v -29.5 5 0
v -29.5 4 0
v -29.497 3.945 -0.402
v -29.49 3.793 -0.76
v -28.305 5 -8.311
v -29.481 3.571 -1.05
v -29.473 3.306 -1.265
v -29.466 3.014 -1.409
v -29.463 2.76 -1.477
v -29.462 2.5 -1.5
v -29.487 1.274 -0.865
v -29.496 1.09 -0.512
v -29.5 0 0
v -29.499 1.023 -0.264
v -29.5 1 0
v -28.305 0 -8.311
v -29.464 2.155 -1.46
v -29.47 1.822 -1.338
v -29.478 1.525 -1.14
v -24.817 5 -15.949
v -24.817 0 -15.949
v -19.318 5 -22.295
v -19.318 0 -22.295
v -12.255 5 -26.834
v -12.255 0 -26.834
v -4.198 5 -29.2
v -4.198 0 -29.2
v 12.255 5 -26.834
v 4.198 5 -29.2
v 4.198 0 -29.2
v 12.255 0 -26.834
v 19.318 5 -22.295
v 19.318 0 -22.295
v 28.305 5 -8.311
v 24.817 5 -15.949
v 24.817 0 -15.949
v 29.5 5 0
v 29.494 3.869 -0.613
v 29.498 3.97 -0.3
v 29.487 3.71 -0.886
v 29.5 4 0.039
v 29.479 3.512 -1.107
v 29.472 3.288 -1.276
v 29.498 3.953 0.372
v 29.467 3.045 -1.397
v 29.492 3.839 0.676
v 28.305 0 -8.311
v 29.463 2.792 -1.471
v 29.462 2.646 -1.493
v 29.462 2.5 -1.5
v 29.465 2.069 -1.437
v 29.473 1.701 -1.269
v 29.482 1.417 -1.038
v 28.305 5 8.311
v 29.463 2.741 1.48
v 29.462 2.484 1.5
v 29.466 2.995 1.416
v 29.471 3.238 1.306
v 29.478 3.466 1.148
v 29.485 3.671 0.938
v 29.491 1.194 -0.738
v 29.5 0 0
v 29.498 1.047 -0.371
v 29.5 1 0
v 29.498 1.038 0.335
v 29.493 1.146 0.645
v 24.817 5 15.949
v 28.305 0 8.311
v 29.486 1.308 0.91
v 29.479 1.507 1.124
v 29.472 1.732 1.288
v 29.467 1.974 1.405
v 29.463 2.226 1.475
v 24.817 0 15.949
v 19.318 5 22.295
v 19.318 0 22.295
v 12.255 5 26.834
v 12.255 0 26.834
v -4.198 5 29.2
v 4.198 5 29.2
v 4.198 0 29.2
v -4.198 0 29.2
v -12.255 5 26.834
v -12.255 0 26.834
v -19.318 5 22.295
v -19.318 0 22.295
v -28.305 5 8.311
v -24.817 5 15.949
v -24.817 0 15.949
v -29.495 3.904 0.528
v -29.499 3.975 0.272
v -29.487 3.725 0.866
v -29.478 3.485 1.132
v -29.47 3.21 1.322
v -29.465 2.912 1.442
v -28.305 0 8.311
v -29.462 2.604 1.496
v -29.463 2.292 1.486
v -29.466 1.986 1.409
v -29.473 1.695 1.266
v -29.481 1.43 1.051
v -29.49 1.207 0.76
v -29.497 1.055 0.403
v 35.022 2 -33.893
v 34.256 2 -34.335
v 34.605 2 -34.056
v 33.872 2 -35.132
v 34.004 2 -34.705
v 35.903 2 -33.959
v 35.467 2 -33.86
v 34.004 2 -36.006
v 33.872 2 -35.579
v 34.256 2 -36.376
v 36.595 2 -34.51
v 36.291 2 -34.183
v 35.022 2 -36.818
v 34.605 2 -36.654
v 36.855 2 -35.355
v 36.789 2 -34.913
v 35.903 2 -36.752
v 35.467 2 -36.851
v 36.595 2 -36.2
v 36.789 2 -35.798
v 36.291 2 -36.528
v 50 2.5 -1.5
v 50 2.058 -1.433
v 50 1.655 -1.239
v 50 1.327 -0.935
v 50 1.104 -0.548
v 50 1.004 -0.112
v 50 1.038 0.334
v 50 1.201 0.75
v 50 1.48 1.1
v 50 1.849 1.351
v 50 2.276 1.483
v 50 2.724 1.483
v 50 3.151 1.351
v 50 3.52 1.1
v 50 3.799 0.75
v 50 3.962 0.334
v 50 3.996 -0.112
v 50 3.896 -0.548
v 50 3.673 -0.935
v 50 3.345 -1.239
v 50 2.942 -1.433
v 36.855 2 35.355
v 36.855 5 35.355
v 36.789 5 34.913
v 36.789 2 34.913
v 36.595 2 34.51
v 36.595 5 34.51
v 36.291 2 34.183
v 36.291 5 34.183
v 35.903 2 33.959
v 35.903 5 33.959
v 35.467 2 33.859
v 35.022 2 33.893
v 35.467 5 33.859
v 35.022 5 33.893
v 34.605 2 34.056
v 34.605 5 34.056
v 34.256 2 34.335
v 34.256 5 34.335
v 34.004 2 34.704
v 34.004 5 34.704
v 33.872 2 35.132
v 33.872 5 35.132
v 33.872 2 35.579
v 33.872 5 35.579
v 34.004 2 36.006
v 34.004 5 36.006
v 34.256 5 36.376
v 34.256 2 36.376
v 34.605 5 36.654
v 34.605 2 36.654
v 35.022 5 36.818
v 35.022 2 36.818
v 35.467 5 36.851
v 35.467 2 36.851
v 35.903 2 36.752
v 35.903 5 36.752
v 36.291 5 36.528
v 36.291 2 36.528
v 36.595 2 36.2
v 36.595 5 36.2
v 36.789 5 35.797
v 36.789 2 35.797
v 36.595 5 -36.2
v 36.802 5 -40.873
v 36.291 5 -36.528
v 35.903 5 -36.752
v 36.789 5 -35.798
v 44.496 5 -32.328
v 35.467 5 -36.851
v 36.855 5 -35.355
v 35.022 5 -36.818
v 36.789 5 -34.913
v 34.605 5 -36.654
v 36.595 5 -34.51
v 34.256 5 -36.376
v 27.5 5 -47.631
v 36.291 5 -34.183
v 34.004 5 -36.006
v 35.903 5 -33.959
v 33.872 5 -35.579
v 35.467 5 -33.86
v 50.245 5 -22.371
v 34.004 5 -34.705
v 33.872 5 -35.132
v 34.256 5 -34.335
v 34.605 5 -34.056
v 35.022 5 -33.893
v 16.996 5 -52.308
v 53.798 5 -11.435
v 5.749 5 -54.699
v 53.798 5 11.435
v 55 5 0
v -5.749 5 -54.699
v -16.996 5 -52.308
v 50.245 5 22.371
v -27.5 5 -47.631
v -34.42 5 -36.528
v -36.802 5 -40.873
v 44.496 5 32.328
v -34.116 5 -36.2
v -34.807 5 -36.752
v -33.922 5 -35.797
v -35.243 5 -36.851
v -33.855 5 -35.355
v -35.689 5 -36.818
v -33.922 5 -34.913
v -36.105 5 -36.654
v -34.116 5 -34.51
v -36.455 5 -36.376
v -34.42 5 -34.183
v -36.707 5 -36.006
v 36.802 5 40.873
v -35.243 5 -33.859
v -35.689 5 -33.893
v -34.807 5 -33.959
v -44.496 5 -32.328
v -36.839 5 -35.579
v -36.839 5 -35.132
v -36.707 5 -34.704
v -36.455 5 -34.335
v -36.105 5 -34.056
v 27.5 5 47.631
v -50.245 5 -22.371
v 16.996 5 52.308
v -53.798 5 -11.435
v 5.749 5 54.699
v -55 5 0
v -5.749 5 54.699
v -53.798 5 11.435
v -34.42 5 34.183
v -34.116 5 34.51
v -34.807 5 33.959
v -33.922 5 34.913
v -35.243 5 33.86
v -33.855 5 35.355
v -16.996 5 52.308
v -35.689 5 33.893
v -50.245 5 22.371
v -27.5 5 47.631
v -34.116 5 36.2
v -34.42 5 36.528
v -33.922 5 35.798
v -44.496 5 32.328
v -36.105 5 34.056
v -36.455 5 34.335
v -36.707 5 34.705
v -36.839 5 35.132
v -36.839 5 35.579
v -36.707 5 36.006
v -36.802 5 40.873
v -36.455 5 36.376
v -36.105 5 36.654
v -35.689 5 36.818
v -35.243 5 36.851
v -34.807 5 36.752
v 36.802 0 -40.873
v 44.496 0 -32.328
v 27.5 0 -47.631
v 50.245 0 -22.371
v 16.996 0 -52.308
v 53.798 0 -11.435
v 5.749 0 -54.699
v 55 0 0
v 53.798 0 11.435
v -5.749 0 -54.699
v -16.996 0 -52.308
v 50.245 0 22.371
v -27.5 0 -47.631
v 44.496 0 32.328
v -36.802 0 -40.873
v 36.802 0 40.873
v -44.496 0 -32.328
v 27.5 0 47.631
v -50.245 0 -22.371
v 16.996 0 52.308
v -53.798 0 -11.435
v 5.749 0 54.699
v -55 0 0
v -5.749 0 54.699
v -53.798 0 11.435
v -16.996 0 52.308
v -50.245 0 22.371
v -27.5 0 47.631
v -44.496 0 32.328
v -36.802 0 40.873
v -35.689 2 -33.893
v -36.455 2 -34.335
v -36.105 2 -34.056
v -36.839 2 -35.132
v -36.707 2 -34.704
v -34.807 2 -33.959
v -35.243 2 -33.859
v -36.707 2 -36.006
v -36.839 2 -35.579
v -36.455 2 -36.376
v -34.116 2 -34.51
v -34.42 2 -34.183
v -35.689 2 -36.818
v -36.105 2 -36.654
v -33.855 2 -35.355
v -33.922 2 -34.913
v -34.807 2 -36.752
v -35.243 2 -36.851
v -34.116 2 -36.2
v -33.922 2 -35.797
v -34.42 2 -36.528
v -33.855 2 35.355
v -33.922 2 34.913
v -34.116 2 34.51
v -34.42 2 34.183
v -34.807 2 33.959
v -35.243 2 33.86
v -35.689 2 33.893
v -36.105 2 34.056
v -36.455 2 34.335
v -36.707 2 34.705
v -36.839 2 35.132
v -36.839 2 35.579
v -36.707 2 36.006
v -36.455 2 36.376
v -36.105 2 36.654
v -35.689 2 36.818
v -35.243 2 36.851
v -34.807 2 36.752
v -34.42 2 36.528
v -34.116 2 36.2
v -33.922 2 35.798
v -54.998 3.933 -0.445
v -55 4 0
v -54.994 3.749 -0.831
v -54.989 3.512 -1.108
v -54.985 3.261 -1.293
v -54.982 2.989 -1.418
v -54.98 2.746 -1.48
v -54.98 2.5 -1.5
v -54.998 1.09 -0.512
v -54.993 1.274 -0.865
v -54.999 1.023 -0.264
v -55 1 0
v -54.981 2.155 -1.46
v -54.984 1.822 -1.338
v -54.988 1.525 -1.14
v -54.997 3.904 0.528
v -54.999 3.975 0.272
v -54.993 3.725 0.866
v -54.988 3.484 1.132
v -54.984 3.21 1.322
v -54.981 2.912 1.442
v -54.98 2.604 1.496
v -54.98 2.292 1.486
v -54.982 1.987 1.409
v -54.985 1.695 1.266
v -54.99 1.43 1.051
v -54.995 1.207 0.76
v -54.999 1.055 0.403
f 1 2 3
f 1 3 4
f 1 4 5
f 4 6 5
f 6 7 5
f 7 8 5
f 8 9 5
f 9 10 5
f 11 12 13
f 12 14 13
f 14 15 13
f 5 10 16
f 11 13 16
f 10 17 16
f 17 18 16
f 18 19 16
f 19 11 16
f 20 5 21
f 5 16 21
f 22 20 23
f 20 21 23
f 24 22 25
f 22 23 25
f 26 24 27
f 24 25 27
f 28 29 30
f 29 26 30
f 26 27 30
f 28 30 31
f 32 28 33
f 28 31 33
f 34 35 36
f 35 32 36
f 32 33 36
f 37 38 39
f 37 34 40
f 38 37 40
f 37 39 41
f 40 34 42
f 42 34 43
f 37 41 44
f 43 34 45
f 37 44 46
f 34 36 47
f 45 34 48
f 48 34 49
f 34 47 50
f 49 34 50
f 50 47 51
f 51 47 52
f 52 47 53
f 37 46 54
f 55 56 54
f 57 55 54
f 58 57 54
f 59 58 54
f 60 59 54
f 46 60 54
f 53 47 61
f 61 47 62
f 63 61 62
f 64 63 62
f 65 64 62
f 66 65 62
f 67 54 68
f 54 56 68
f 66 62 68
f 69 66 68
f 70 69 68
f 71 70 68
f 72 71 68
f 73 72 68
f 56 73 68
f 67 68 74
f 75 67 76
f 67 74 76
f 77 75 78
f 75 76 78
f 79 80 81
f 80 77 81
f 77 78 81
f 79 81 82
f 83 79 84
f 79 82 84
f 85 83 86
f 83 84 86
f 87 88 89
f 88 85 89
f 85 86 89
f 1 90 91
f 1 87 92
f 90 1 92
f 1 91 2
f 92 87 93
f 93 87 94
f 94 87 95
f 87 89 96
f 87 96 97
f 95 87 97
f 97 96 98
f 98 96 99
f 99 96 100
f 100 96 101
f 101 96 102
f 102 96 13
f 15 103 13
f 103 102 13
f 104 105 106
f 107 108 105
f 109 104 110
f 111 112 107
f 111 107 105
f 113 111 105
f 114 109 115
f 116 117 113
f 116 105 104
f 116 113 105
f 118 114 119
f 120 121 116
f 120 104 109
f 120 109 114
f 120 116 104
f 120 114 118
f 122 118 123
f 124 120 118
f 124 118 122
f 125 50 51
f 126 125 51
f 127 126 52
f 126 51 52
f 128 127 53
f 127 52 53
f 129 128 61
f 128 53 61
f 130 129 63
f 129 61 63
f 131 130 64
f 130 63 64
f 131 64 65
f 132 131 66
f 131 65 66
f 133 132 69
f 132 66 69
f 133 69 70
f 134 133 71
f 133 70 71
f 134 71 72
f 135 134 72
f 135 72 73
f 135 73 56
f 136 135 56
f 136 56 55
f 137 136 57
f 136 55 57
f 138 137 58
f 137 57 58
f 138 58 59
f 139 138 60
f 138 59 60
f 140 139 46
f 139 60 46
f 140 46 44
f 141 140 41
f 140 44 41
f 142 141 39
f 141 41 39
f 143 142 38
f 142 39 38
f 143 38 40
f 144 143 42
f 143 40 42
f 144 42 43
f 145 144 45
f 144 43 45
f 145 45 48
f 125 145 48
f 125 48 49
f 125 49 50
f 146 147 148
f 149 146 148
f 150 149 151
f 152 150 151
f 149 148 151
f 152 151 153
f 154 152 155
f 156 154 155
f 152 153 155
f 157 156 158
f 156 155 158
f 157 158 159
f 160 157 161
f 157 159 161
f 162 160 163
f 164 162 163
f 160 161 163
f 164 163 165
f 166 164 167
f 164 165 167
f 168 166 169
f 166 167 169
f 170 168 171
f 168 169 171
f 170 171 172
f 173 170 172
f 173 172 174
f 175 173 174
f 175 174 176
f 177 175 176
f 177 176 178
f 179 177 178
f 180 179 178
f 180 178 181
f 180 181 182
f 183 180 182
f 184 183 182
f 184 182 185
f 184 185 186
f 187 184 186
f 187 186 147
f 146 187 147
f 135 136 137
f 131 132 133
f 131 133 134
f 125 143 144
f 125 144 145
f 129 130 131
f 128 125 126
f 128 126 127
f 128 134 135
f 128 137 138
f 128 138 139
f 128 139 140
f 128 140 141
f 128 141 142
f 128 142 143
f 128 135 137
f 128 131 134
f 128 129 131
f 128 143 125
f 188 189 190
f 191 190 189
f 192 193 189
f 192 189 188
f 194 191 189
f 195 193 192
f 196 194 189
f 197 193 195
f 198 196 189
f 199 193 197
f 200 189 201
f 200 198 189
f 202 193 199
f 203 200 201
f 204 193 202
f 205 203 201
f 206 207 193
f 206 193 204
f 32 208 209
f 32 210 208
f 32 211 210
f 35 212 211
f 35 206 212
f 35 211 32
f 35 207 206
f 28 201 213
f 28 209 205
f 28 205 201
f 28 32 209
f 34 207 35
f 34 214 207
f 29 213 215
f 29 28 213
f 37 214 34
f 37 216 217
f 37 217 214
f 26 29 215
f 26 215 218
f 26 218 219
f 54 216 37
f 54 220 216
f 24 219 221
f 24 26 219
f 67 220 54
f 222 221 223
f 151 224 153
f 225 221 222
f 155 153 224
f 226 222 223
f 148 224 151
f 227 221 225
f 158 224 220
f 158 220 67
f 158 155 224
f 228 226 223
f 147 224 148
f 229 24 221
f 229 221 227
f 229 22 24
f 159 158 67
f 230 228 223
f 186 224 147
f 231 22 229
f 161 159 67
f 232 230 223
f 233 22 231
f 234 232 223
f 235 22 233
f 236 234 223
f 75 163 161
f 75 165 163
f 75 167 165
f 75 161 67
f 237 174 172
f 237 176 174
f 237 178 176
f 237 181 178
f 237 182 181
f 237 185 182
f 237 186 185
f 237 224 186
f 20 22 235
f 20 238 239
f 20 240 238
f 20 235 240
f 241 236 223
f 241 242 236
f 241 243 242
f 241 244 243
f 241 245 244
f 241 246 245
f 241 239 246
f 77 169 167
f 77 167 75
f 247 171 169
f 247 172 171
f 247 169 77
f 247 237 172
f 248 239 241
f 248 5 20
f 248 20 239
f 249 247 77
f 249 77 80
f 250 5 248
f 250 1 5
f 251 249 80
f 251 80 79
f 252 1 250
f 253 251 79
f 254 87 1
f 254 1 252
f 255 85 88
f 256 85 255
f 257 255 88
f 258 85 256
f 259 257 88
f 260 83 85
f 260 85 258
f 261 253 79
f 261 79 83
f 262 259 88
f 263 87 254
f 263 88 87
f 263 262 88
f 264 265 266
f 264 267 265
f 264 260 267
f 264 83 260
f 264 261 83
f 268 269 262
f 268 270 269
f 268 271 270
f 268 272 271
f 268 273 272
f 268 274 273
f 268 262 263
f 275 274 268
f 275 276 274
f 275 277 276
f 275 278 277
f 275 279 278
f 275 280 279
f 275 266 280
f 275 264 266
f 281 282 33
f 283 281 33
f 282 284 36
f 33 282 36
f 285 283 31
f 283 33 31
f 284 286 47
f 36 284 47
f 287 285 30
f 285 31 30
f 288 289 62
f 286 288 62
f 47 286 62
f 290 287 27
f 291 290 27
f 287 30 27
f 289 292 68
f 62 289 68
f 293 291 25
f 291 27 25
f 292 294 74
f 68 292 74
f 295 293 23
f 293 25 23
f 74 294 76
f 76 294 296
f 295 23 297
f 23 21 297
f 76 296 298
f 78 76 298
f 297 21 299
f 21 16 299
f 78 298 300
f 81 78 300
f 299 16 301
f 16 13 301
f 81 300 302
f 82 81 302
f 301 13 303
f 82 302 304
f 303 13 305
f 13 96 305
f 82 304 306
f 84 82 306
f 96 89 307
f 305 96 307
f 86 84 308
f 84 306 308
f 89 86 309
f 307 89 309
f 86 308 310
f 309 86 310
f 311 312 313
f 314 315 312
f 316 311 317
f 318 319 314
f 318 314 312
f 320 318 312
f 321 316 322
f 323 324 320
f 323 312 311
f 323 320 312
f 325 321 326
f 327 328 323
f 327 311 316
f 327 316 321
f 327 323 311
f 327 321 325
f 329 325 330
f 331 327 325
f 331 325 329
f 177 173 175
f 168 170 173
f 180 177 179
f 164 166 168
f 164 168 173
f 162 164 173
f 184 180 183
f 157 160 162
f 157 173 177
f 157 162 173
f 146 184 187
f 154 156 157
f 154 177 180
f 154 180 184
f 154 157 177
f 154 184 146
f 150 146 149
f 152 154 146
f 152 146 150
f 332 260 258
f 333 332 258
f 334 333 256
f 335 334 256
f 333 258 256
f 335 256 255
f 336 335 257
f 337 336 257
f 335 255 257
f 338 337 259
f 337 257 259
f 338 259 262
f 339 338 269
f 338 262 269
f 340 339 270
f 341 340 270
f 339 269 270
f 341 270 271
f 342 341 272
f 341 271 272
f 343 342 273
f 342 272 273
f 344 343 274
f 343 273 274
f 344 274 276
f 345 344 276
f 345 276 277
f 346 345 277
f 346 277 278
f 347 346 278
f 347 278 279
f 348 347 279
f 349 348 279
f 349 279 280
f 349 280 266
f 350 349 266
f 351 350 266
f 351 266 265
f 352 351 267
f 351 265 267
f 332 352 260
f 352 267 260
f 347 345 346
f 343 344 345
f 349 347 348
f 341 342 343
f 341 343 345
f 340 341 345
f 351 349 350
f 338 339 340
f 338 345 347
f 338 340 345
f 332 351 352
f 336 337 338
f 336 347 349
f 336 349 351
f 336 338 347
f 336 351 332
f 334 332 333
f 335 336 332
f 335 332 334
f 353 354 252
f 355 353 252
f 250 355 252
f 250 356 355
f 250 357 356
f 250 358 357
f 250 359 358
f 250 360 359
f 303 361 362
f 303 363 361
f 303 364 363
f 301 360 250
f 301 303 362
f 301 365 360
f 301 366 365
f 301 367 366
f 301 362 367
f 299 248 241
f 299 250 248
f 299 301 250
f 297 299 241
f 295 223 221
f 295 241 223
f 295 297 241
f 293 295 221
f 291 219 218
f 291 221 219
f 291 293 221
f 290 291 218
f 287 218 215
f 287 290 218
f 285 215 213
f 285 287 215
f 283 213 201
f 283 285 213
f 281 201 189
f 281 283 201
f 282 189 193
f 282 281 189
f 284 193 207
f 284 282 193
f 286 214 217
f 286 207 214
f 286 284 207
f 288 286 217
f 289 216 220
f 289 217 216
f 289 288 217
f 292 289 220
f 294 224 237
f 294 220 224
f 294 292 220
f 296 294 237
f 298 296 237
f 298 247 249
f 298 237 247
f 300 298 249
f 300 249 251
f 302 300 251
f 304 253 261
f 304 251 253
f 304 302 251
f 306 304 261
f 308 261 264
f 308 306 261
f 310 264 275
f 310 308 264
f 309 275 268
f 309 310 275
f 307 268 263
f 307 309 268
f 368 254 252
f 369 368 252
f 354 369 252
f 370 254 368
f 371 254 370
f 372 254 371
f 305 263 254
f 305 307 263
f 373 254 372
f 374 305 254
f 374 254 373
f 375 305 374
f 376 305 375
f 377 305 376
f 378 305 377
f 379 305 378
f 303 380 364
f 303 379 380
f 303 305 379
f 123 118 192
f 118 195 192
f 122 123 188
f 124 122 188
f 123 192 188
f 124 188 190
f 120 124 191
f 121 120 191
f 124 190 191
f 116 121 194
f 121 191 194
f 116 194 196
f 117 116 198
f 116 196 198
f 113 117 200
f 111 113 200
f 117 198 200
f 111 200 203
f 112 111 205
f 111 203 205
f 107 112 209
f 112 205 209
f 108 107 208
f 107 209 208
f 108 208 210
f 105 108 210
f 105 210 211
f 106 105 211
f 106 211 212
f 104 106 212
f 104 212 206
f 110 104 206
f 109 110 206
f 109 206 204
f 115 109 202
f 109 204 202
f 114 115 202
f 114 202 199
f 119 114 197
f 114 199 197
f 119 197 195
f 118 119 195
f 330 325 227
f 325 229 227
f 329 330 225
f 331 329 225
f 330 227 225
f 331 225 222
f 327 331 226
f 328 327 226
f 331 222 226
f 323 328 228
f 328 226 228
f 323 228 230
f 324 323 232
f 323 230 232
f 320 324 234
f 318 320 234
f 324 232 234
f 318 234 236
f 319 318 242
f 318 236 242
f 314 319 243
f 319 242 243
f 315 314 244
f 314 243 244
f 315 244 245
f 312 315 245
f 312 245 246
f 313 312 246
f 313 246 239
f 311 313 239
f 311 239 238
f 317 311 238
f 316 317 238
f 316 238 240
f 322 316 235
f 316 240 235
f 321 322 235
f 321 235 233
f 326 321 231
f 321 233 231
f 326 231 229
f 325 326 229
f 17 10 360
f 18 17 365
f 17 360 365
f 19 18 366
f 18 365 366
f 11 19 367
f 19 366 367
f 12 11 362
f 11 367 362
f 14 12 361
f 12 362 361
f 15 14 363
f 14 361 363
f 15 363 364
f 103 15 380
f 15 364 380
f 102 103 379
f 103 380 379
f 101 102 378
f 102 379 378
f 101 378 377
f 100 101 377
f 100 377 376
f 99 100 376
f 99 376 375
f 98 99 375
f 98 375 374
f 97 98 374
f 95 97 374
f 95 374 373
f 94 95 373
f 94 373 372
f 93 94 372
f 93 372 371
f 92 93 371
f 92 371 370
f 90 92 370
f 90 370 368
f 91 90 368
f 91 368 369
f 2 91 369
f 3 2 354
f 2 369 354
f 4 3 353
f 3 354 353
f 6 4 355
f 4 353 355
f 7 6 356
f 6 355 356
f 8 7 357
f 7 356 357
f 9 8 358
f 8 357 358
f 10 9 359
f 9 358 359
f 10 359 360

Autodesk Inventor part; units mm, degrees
ref_plane "XZ Plane" through (0, 0, 0) normal (0, 1, 0) x (-1, 0, 0)
ref_plane "XY Plane" through (0, 0, 0) normal (0, 0, 1) x (1, 0, 0)
sketch "Sketch1" plane through (0, 0, 0) normal (0, 1, 0) x (-1, 0, 0)
  circle A0 centre (0, 0) radius 55
  circle A1 centre (0, 0) radius 29.5
  dimension "d0" = 110
  dimension "d1" = 59
extrude "Extrusion1" add sketch "Sketch1" along normal blind 5
ref_plane "Work Plane1" through (50, 0, 0) normal (1, 0, 0) x (0, 1, 0)
sketch "Sketch2" plane through (50, 0, 0) normal (1, 0, 0) x (0, 1, 0)
  circle A0 centre (2.5, 0) radius 1.5
  line L0 (5, -55) -> (5, 55) projected
  point P0 (0, 0)
  dimension "d5" = 3
  dimension "d6" = 2.5
hole "Hole1" at (50, 2.5, 0) direction (-1, 0, 0) diameter 3 end through all
sketch "Sketch6" plane through (0, 5, 0) normal (0, 1, 0) x (1, 0, 0)
  circle A0 centre (-35.3554, 35.3553) radius 1.5
  circle A1 centre (35.3553, 35.3554) radius 1.5
  circle A2 centre (35.3554, -35.3553) radius 1.5
  circle A3 centre (-35.3553, -35.3554) radius 1.5
  point P0 (0, 0)
  dimension "d30" = 3
  dimension "d31" = 50
  dimension "d32" = 3
  dimension "d33" = 50
  dimension "d34" = 90
  dimension "d35" = 35.3553
  dimension "d36" = 3
  dimension "d37" = 3
  dimension "d38" = 50
  dimension "d39" = 90
  dimension "d40" = 50
  dimension "d41" = 90
extrude "Extrusion6" cut sketch "Sketch6" against normal blind 3
properties part number "Mirror Support 2"
